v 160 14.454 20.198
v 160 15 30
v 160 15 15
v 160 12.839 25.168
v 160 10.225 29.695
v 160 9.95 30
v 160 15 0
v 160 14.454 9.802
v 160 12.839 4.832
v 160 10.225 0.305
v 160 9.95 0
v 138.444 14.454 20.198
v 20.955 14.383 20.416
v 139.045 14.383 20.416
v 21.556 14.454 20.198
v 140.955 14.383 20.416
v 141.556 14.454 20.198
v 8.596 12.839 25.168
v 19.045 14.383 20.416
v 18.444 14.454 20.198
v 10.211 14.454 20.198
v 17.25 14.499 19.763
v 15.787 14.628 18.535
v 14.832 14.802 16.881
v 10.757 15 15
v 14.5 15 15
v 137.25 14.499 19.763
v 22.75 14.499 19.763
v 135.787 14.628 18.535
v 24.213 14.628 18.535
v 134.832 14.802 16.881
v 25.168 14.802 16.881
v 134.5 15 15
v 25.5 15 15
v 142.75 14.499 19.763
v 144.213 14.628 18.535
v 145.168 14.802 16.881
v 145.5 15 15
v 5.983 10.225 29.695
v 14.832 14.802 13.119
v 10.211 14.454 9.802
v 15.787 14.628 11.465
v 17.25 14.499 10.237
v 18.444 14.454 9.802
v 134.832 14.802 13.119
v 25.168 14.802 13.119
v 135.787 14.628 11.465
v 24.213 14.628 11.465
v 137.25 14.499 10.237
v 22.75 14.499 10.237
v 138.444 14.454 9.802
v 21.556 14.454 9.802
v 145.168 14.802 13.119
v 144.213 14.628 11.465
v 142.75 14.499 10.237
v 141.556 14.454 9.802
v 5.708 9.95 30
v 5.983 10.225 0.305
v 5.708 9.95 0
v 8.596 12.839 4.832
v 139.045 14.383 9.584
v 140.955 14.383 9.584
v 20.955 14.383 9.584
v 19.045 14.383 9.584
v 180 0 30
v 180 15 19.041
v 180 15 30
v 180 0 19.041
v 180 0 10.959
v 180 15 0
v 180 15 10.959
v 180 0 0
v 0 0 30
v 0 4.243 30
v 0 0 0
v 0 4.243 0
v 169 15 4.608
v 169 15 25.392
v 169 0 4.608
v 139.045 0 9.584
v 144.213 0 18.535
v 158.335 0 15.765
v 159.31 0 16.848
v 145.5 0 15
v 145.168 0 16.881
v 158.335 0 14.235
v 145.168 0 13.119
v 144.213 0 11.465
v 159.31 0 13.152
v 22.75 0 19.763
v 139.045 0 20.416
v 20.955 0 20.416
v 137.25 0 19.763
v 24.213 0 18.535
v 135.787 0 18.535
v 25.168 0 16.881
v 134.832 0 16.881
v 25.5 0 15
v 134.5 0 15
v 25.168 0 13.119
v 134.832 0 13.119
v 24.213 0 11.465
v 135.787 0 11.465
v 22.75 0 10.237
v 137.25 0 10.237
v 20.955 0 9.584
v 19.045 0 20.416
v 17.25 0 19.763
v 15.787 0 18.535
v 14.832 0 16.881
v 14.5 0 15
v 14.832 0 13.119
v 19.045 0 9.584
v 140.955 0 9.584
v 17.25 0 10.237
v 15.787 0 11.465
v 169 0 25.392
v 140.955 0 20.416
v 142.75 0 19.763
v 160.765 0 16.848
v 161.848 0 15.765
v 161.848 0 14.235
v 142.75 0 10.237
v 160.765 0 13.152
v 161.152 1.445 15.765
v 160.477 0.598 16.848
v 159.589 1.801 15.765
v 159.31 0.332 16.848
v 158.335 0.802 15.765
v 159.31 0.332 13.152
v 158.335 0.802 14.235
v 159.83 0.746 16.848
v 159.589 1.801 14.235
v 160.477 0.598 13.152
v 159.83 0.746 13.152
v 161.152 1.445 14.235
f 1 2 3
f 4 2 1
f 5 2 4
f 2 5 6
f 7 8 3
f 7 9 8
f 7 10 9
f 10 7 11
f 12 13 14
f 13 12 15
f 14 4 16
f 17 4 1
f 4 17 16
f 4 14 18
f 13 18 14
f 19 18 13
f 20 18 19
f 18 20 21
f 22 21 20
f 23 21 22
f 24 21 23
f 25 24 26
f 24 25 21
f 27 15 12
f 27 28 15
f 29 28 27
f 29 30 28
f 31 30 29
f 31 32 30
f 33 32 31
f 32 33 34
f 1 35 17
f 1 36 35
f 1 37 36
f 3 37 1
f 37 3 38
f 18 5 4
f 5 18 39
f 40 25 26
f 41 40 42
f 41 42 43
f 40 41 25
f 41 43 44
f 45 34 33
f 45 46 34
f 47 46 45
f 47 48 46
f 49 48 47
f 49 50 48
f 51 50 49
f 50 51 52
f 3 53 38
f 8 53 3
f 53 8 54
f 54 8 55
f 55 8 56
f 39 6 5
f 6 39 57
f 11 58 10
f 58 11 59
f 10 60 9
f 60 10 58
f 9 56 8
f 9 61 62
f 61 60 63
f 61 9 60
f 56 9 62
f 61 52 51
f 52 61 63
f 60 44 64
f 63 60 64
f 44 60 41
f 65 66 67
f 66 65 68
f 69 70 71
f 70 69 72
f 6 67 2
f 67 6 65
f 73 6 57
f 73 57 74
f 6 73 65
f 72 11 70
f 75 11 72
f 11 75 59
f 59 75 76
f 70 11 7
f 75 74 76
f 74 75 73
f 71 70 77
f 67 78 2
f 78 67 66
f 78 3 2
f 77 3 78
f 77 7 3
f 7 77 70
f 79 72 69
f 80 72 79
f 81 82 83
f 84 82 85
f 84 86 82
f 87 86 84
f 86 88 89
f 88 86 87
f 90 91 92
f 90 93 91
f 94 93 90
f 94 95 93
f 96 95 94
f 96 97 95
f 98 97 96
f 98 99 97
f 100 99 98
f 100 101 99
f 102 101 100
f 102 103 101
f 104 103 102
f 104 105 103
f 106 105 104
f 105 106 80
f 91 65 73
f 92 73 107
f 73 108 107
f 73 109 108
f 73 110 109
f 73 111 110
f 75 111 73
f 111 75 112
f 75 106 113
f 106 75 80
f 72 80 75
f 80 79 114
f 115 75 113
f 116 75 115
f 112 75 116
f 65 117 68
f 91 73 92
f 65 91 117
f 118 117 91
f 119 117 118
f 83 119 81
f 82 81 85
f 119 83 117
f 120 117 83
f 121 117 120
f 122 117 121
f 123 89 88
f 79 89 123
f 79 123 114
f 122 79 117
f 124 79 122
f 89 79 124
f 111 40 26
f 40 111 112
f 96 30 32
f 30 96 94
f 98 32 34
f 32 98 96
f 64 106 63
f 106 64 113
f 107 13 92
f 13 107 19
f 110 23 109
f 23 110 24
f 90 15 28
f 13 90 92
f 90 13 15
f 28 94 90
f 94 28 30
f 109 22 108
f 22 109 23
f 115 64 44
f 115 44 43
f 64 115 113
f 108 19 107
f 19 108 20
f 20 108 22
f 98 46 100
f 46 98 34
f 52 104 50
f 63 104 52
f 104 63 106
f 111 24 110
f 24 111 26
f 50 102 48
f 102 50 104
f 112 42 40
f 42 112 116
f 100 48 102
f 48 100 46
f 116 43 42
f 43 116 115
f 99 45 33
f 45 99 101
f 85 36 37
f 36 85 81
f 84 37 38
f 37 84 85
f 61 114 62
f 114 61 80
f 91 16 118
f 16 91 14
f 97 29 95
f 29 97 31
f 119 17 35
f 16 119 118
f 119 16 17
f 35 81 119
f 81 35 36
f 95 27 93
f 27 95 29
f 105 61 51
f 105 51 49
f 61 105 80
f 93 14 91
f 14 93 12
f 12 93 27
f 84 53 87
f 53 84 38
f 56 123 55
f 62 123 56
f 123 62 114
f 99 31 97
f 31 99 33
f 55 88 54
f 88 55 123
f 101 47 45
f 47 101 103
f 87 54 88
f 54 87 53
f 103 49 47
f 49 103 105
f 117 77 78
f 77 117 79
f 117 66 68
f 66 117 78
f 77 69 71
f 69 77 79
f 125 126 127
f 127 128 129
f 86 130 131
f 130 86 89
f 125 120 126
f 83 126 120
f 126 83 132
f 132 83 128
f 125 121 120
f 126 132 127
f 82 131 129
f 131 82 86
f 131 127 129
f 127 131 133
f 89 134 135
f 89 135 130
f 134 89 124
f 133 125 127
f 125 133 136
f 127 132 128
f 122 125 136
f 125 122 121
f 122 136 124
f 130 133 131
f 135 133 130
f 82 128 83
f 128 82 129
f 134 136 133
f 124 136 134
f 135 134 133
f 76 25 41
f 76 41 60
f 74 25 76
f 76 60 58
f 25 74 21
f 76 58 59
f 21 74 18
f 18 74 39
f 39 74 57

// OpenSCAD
difference(){
	cube([180,15,30]);
	translate([20,50,15])
	rotate(90,[1,0,0])
		#cylinder(r=5.5,h=80);
	translate([140,50,15])
	rotate(90,[1,0,0])
		#cylinder(r=5.5,h=80);
	translate([175,50,15])
		rotate(90,[1,0,0])
		#cylinder(r=12,h=80, $fn=3);
	translate([160,0,15])
		#sphere(r=2);
	rotate(90,[1,0,0])
		rotate(90,[0,1,0])
			translate([-10,15,-40])
				difference(){
					cylinder(r=30,h=200);
					translate([0,0,-10])
						cylinder(r=25,h=220);
				}
	rotate(45,[0,0,1])
		translate([-14,3,00])
			#cube([50,20,40]);
}
